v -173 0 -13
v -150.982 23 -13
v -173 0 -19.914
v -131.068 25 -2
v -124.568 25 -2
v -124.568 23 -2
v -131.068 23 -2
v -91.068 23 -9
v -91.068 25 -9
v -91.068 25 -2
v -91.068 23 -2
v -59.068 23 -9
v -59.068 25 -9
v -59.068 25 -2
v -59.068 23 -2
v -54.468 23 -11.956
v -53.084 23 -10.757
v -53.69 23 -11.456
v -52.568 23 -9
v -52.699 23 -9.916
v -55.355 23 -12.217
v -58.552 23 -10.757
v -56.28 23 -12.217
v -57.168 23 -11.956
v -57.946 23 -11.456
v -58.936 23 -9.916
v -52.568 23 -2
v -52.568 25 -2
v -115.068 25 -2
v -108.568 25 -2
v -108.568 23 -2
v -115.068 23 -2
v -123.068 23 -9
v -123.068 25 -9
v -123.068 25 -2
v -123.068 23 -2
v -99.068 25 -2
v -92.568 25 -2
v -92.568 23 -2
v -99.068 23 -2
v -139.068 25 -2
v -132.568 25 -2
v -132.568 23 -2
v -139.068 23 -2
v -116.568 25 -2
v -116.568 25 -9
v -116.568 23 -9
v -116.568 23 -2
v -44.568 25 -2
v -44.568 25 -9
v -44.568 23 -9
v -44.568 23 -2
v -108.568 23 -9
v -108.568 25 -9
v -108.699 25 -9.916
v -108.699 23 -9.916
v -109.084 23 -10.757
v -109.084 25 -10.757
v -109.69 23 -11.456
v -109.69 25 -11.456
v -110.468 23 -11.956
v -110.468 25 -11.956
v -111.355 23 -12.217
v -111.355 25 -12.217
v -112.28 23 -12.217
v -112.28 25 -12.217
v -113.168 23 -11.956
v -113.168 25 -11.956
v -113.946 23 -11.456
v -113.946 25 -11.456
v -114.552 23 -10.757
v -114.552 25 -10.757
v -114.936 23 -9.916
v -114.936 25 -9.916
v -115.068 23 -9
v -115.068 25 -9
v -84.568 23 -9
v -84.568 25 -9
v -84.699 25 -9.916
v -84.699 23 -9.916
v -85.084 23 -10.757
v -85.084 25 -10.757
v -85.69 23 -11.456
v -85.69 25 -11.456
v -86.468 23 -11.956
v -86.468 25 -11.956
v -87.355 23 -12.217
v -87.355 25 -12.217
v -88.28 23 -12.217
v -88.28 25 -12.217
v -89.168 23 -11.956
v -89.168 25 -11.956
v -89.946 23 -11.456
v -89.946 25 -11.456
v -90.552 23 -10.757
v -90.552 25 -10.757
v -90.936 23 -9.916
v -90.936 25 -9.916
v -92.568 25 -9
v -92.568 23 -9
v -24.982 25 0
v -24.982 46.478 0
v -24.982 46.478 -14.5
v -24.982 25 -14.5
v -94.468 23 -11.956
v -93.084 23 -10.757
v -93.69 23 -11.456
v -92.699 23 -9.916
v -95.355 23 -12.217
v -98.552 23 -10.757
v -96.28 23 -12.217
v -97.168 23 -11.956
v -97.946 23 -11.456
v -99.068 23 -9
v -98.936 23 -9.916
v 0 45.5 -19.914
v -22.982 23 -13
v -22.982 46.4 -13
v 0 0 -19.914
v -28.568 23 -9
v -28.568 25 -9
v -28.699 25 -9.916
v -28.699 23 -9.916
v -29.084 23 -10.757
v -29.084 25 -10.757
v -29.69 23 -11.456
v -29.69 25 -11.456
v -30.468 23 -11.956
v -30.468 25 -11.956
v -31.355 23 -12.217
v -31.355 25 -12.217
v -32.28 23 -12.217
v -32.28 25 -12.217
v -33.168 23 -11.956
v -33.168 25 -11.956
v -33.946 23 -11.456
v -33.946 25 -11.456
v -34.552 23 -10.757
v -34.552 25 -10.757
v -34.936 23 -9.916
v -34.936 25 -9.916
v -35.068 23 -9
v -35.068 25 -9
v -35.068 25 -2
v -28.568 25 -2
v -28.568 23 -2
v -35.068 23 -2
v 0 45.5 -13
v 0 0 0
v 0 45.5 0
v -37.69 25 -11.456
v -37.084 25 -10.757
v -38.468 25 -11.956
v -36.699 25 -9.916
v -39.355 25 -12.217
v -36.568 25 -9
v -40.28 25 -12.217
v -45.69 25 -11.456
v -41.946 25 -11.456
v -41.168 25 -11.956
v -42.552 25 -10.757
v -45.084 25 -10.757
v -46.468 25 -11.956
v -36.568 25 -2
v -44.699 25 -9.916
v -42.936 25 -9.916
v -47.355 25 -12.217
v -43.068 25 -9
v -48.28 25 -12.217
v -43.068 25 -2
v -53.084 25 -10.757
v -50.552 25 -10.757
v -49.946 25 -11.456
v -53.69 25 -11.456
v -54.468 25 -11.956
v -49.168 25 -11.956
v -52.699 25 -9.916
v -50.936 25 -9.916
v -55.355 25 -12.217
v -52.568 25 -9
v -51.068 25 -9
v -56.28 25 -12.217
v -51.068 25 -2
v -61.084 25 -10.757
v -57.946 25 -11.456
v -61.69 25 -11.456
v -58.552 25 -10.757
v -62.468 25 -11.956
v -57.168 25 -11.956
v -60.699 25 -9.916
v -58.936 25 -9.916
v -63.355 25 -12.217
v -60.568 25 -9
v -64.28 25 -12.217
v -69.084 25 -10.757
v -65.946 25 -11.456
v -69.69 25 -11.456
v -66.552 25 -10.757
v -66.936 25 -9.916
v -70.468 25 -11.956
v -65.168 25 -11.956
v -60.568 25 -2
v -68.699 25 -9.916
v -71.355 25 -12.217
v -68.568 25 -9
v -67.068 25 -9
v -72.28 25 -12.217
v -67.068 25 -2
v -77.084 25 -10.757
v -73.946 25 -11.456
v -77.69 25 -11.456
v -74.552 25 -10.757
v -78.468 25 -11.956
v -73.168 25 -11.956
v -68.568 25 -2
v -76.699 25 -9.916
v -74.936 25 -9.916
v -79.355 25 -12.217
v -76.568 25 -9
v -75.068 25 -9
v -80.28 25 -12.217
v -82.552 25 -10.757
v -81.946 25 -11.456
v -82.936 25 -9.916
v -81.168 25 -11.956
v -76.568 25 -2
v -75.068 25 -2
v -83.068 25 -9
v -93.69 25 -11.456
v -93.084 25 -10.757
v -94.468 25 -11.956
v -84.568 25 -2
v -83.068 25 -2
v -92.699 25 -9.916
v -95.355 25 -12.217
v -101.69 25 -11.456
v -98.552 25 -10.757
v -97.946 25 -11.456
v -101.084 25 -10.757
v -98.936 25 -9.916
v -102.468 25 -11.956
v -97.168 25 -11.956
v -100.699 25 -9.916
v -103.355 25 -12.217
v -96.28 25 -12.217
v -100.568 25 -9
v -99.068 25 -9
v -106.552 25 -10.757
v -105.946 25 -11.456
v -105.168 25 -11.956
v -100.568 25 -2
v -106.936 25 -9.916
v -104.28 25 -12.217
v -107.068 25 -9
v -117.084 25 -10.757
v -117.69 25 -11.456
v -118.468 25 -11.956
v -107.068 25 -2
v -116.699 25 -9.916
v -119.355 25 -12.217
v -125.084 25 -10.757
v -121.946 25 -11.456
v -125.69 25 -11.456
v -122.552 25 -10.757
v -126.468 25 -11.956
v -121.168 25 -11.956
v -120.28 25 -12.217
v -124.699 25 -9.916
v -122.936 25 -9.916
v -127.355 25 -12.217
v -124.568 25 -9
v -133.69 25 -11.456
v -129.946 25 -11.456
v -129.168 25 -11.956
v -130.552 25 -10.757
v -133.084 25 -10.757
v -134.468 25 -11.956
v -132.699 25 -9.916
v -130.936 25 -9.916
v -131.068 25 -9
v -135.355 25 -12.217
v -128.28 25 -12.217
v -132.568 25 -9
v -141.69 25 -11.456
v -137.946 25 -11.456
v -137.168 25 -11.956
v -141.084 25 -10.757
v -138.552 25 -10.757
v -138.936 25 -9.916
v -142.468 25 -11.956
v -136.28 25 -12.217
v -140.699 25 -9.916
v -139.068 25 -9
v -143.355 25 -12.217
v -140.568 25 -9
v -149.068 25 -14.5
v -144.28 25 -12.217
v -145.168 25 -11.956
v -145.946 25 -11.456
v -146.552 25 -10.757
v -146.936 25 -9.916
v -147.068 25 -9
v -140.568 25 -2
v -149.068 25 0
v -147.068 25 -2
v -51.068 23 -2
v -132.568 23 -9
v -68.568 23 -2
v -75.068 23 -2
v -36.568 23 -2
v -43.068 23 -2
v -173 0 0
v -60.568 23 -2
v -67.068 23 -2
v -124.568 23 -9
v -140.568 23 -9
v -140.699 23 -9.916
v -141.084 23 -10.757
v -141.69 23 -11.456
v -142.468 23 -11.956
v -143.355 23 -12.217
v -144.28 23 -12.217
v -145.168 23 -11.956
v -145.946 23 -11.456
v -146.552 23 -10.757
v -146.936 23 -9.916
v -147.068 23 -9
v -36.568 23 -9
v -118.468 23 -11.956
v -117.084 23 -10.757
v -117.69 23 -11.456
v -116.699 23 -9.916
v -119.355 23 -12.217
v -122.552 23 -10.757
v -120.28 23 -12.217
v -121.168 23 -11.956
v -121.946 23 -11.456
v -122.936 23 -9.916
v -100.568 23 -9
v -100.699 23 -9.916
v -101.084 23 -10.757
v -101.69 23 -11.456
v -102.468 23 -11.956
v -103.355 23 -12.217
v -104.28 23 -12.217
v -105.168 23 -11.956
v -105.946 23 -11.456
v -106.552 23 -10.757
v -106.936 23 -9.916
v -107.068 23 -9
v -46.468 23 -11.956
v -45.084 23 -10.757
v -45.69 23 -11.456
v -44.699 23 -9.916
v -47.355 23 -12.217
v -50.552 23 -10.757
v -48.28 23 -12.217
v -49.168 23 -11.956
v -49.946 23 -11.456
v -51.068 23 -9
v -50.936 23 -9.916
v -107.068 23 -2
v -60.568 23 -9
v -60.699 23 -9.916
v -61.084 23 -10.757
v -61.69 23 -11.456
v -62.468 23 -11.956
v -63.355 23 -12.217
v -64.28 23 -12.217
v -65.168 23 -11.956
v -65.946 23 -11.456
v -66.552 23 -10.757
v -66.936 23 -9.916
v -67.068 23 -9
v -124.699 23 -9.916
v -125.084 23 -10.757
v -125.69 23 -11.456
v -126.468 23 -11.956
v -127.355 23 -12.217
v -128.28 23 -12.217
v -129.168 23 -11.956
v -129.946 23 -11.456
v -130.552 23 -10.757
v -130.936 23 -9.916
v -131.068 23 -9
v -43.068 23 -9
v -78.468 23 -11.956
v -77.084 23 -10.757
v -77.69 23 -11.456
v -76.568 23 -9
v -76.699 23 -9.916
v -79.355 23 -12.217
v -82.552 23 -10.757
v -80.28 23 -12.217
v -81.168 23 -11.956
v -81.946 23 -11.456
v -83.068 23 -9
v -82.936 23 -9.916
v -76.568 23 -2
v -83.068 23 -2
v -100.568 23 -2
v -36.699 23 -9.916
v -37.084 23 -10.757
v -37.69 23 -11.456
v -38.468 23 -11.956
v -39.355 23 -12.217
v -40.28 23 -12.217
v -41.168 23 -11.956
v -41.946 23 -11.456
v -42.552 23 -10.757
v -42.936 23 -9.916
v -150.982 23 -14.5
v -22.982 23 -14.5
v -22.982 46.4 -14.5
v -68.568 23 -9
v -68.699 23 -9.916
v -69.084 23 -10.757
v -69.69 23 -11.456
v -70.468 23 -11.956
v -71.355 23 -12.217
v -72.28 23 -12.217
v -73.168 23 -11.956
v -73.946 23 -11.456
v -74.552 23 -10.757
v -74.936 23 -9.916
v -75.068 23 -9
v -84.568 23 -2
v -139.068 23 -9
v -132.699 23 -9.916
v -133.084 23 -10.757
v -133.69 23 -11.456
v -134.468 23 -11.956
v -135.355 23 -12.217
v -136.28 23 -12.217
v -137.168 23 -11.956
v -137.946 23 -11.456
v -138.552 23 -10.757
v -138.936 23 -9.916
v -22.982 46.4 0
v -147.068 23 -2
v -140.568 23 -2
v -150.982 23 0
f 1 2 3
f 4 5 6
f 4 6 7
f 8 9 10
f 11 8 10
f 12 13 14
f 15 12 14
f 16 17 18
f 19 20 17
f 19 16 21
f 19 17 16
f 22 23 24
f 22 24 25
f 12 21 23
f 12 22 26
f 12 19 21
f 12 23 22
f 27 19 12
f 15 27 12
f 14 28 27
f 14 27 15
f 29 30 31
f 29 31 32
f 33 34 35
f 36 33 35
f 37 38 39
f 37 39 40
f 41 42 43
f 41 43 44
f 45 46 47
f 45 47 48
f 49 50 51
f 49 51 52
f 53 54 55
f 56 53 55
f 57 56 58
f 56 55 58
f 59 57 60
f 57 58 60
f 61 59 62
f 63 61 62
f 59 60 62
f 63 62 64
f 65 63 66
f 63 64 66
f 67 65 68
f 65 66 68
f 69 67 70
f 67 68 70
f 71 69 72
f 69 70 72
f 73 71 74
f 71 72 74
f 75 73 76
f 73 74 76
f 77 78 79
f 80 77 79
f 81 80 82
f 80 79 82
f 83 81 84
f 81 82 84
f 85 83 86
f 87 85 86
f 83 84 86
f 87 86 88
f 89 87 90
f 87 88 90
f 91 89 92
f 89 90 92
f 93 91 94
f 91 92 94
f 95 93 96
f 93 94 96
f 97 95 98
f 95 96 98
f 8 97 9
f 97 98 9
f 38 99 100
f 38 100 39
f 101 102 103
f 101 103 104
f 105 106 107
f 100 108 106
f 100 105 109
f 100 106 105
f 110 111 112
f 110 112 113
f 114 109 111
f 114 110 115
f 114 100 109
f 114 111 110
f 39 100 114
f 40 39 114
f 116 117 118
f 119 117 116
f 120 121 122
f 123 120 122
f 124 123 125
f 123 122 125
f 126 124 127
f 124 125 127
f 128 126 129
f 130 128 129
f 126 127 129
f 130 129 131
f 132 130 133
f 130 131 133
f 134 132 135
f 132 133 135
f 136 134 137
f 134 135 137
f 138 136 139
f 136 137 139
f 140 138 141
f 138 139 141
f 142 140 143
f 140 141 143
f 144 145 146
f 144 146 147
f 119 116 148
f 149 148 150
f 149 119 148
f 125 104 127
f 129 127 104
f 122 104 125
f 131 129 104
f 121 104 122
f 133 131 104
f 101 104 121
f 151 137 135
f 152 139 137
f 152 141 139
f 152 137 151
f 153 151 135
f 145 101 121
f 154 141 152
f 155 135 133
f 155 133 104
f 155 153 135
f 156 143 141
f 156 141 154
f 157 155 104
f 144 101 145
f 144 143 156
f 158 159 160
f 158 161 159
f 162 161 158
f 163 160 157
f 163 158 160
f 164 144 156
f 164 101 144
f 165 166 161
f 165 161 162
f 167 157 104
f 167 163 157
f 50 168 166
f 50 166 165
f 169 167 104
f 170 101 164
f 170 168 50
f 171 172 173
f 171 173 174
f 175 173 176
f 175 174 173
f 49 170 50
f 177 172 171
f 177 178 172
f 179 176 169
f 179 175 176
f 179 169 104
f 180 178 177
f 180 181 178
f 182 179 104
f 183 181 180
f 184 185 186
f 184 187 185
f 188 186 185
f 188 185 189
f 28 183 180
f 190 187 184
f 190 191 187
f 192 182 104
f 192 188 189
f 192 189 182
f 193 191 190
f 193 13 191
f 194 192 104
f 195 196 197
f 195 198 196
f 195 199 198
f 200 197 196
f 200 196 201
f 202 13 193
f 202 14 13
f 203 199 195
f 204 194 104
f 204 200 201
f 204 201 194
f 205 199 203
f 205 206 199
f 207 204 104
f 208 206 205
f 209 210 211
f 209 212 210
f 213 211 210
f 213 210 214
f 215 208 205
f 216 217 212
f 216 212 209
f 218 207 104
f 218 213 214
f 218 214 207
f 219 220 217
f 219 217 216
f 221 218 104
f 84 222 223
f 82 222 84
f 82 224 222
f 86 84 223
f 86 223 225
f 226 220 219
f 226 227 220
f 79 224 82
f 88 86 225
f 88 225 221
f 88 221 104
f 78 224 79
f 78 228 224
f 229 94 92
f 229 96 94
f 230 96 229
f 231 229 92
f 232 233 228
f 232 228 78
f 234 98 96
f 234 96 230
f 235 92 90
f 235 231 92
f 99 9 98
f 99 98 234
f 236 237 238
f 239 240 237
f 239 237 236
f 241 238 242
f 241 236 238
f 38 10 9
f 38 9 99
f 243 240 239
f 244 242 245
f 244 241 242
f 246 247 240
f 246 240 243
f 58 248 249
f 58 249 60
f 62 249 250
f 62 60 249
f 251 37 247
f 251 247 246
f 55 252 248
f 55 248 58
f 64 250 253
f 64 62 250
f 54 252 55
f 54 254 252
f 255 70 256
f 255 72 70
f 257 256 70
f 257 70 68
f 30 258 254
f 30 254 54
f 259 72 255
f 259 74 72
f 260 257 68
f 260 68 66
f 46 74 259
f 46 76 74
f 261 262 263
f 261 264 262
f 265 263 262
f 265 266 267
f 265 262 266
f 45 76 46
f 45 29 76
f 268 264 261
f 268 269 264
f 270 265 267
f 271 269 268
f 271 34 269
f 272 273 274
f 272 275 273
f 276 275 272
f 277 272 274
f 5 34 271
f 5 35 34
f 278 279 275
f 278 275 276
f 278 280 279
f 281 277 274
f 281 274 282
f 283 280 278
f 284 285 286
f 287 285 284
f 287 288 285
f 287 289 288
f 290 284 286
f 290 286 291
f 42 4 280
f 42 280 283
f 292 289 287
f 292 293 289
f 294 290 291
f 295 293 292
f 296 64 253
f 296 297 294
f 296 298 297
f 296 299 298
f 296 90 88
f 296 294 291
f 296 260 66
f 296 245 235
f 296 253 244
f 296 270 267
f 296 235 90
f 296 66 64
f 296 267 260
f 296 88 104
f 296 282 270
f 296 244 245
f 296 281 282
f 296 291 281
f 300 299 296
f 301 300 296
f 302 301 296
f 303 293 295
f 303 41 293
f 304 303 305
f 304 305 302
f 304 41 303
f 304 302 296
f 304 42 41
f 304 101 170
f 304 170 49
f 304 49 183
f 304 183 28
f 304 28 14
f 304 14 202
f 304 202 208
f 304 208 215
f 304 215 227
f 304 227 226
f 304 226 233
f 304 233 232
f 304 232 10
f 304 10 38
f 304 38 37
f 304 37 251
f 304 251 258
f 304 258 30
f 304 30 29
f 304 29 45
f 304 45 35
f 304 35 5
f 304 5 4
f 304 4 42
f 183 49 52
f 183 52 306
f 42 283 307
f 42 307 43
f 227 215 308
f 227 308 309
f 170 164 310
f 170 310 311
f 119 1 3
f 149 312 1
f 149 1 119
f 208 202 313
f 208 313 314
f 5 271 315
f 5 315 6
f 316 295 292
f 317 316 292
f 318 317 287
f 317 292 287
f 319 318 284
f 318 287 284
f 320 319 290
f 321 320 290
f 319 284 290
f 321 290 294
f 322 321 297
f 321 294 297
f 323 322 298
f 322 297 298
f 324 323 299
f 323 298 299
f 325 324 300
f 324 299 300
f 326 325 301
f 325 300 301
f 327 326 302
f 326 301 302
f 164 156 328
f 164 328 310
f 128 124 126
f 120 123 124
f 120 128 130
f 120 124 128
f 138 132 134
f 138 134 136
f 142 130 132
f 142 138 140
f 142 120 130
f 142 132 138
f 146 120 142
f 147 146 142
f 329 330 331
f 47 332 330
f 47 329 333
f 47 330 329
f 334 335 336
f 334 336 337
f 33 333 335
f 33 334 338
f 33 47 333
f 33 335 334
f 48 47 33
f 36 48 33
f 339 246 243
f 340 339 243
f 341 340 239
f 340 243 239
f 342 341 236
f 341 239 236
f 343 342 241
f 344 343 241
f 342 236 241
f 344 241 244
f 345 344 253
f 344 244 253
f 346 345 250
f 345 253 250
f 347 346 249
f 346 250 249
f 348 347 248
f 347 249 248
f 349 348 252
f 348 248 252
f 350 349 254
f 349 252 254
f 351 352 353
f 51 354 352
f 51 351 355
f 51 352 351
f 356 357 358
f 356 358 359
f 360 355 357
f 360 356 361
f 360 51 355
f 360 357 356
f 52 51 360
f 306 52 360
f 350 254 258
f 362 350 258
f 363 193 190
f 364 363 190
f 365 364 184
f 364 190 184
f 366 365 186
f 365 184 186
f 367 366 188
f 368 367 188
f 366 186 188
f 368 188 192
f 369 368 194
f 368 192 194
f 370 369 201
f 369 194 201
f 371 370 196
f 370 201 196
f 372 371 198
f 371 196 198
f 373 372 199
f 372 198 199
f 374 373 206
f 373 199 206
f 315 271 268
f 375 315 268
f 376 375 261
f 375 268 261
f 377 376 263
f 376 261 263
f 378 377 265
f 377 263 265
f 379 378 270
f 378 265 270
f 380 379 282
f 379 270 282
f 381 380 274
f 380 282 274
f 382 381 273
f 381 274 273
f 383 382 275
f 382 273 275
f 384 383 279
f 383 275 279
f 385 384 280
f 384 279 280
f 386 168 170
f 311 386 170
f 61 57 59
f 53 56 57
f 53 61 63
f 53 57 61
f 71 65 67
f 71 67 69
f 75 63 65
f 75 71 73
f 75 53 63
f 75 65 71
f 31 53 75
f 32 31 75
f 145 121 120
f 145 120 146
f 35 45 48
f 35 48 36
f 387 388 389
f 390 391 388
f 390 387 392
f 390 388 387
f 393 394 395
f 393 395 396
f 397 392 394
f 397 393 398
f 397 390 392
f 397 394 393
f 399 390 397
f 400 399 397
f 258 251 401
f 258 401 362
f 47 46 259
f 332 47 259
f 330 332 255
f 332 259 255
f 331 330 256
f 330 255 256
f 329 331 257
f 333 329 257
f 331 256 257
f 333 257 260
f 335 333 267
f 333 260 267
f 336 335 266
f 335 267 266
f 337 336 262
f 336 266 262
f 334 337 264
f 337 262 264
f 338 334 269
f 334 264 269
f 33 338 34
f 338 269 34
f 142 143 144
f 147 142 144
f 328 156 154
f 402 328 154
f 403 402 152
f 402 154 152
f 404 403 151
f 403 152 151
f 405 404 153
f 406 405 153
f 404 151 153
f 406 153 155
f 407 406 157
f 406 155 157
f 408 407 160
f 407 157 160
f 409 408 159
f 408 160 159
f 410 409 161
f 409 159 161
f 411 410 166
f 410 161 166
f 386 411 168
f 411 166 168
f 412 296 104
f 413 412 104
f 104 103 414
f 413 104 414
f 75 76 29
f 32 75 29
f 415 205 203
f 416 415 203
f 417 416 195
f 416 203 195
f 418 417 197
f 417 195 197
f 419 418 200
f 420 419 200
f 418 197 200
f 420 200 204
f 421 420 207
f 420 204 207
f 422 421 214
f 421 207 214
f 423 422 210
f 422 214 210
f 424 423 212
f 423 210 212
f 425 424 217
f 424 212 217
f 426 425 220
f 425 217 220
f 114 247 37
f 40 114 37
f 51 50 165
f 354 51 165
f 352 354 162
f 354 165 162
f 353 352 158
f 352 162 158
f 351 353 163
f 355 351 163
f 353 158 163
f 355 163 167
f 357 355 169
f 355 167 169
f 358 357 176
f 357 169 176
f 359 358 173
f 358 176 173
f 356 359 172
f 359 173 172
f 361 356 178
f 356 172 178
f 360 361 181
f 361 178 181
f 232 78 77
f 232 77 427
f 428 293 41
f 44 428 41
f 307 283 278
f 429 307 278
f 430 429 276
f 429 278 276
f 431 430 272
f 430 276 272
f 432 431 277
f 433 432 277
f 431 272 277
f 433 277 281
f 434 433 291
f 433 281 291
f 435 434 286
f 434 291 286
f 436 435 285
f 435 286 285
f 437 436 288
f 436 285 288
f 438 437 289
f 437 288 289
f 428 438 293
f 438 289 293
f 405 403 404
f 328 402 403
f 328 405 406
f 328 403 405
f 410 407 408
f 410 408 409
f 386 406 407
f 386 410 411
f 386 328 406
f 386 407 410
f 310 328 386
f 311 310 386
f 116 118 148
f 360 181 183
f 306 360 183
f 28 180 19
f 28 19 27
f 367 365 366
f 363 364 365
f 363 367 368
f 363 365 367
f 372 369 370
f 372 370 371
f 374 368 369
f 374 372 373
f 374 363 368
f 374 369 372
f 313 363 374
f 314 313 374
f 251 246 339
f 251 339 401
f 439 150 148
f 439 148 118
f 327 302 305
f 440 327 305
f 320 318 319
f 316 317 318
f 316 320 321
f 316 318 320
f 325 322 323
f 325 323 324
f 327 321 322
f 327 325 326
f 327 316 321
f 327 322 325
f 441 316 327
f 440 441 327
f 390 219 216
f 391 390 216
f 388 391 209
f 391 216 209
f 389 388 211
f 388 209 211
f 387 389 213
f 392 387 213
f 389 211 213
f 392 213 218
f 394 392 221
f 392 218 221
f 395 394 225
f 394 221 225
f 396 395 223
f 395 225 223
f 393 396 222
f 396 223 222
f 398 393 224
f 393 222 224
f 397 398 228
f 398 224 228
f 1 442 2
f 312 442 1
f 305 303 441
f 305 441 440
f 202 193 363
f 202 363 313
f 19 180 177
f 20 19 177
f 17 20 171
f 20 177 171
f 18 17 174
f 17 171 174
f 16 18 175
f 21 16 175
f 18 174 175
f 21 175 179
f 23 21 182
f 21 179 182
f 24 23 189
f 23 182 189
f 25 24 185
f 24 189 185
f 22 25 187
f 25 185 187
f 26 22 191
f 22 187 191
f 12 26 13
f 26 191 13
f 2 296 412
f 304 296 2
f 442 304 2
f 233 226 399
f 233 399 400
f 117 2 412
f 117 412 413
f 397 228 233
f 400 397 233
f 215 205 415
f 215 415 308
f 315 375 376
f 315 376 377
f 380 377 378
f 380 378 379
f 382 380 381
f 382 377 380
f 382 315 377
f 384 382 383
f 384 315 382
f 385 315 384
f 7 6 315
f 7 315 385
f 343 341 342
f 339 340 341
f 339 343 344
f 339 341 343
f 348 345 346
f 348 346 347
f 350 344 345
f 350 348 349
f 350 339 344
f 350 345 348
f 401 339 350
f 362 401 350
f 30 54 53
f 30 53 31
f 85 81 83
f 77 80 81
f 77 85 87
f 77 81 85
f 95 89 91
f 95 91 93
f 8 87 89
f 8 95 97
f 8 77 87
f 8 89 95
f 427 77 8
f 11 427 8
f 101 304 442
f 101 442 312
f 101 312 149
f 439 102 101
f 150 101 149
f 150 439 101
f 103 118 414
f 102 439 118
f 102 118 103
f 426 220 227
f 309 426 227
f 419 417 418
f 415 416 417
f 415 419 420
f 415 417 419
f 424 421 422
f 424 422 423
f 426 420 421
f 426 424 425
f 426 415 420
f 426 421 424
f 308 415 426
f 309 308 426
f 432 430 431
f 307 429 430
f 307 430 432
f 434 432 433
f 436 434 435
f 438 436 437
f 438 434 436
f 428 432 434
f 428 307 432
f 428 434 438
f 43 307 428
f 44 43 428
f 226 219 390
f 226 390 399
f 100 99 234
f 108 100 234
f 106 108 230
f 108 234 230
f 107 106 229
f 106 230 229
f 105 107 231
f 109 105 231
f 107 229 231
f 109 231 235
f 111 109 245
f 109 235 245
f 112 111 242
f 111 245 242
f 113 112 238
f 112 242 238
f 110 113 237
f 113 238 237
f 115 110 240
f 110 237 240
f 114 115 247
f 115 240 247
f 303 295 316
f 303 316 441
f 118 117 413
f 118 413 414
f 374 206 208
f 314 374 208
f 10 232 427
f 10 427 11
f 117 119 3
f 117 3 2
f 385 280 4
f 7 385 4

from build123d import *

# Parameters (mm, degrees)
F1_DEPTH = 13
F3_REACH = 70.401
F5_REACH = 197.0178690716
F7_DEPTH = 14.5
F8_W     = 6.5
F8_H     = 7
F9_DEPTH = 2


with BuildPart() as f1:
    # F0 (on Top) → F1 (new body)
    with BuildSketch(Plane.XY):
        Polygon((-43.3400757611, 0), (0, 0), (0, 45.5), (-22.9823845586, 46.4), (-22.9823845586, 23), (-150.9823845586, 23), (-173, 0), align=None)
    extrude(amount=-F1_DEPTH)

    f3_end = Plane(origin=(-11.4911922793, 45.95, -6.5), x_dir=(0.9992341112, -0.0391304348, 0), z_dir=(0.0391304348, 0.9992341112, 0))
    # F2 (on face) → F3 (join, up to a plane its end follows)
    with BuildSketch(Plane.XZ):
        Polygon((-20.9823845586, -13), (-22.9823845586, -13), (0, -19.9144775652), (0, -13), align=None)
    f3_long = extrude(amount=-F3_REACH, mode=Mode.PRIVATE)
    add(split(f3_long, bisect_by=f3_end, keep=Keep.BOTTOM, mode=Mode.PRIVATE))

    f5_end = Plane(origin=(-161.9911922793, 11.5, -6.5), x_dir=(-0.6915115049, -0.7223654467, 0), z_dir=(-0.7223654467, 0.6915115049, 0))
    # F4 (on face) → F5 (join, up to a plane its end follows)
    with BuildSketch(Plane.YZ):
        Polygon((23, -13), (0, -13), (0, -19.9144775652), align=None)
    f5_long = extrude(amount=-F5_REACH, mode=Mode.PRIVATE)
    add(split(f5_long, bisect_by=f5_end, keep=Keep.BOTTOM, mode=Mode.PRIVATE))

    # F6 (on face) → F7 (join)
    with BuildSketch(Plane.XY):
        Polygon((-149.0678093028, 25), (-150.9823845586, 23), (-22.9823845586, 23), (-22.9823845586, 46.4), (-24.9823845586, 46.4783208546), (-24.9823845586, 25), align=None)
    extrude(amount=-F7_DEPTH)

    # F8 (on face) → F9 (cut)
    with BuildSketch(Plane(origin=(0, 25, 0), x_dir=(-1, 0, 0), z_dir=(0, 1, 0))):
        with Locations((143.8178093028, -5.5)):
            Rectangle(F8_W, F8_H)
        with BuildLine():
            ThreePointArc((140.5678093028, -9), (143.8178093028, -12.25), (147.0678093028, -9))
            Line((147.0678093028, -9), (140.5678093028, -9))
        make_face()
        with BuildLine():
            Line((139.0678093028, -9), (132.5678093028, -9))
            ThreePointArc((132.5678093028, -9), (135.8178093028, -12.25), (139.0678093028, -9))
        make_face()
        with Locations((135.8178093028, -5.5)):
            Rectangle(F8_W, F8_H)
        with Locations((127.8178093028, -5.5)):
            Rectangle(F8_W, F8_H)
        with Locations((119.8178093028, -5.5)):
            Rectangle(F8_W, F8_H)
        with Locations((111.8178093028, -5.5)):
            Rectangle(F8_W, F8_H)
        with Locations((103.8178093028, -5.5)):
            Rectangle(F8_W, F8_H)
        with Locations((95.8178093028, -5.5)):
            Rectangle(F8_W, F8_H)
        with Locations((87.8178093028, -5.5)):
            Rectangle(F8_W, F8_H)
        with Locations((79.8178093028, -5.5)):
            Rectangle(F8_W, F8_H)
        with Locations((71.8178093028, -5.5)):
            Rectangle(F8_W, F8_H)
        with Locations((63.8178093028, -5.5)):
            Rectangle(F8_W, F8_H)
        with Locations((55.8178093028, -5.5)):
            Rectangle(F8_W, F8_H)
        with Locations((47.8178093028, -5.5)):
            Rectangle(F8_W, F8_H)
        with Locations((39.8178093028, -5.5)):
            Rectangle(F8_W, F8_H)
        with Locations((31.8178093028, -5.5)):
            Rectangle(F8_W, F8_H)
        with BuildLine():
            Line((35.0678093028, -9), (28.5678093028, -9))
            ThreePointArc((28.5678093028, -9), (31.8178093028, -12.25), (35.0678093028, -9))
        make_face()
        with BuildLine():
            Line((43.0678093028, -9), (36.5678093028, -9))
            ThreePointArc((36.5678093028, -9), (39.8178093028, -12.25), (43.0678093028, -9))
        make_face()
        with BuildLine():
            Line((51.0678093028, -9), (44.5678093028, -9))
            ThreePointArc((44.5678093028, -9), (47.8178093028, -12.25), (51.0678093028, -9))
        make_face()
        with BuildLine():
            Line((59.0678093028, -9), (52.5678093028, -9))
            ThreePointArc((52.5678093028, -9), (55.8178093028, -12.25), (59.0678093028, -9))
        make_face()
        with BuildLine():
            Line((67.0678093028, -9), (60.5678093028, -9))
            ThreePointArc((60.5678093028, -9), (63.8178093028, -12.25), (67.0678093028, -9))
        make_face()
        with BuildLine():
            Line((75.0678093028, -9), (68.5678093028, -9))
            ThreePointArc((68.5678093028, -9), (71.8178093028, -12.25), (75.0678093028, -9))
        make_face()
        with BuildLine():
            Line((83.0678093028, -9), (76.5678093028, -9))
            ThreePointArc((76.5678093028, -9), (79.8178093028, -12.25), (83.0678093028, -9))
        make_face()
        with BuildLine():
            Line((91.0678093028, -9), (84.5678093028, -9))
            ThreePointArc((84.5678093028, -9), (87.8178093028, -12.25), (91.0678093028, -9))
        make_face()
        with BuildLine():
            Line((99.0678093028, -9), (92.5678093028, -9))
            ThreePointArc((92.5678093028, -9), (95.8178093028, -12.25), (99.0678093028, -9))
        make_face()
        with BuildLine():
            Line((107.0678093028, -9), (100.5678093028, -9))
            ThreePointArc((100.5678093028, -9), (103.8178093028, -12.25), (107.0678093028, -9))
        make_face()
        with BuildLine():
            Line((115.0678093028, -9), (108.5678093028, -9))
            ThreePointArc((108.5678093028, -9), (111.8178093028, -12.25), (115.0678093028, -9))
        make_face()
        with BuildLine():
            Line((123.0678093028, -9), (116.5678093028, -9))
            ThreePointArc((116.5678093028, -9), (119.8178093028, -12.25), (123.0678093028, -9))
        make_face()
        with BuildLine():
            Line((131.0678093028, -9), (124.5678093028, -9))
            ThreePointArc((124.5678093028, -9), (127.8178093028, -12.25), (131.0678093028, -9))
        make_face()
    extrude(amount=-F9_DEPTH, mode=Mode.SUBTRACT)


solid = f1.part
